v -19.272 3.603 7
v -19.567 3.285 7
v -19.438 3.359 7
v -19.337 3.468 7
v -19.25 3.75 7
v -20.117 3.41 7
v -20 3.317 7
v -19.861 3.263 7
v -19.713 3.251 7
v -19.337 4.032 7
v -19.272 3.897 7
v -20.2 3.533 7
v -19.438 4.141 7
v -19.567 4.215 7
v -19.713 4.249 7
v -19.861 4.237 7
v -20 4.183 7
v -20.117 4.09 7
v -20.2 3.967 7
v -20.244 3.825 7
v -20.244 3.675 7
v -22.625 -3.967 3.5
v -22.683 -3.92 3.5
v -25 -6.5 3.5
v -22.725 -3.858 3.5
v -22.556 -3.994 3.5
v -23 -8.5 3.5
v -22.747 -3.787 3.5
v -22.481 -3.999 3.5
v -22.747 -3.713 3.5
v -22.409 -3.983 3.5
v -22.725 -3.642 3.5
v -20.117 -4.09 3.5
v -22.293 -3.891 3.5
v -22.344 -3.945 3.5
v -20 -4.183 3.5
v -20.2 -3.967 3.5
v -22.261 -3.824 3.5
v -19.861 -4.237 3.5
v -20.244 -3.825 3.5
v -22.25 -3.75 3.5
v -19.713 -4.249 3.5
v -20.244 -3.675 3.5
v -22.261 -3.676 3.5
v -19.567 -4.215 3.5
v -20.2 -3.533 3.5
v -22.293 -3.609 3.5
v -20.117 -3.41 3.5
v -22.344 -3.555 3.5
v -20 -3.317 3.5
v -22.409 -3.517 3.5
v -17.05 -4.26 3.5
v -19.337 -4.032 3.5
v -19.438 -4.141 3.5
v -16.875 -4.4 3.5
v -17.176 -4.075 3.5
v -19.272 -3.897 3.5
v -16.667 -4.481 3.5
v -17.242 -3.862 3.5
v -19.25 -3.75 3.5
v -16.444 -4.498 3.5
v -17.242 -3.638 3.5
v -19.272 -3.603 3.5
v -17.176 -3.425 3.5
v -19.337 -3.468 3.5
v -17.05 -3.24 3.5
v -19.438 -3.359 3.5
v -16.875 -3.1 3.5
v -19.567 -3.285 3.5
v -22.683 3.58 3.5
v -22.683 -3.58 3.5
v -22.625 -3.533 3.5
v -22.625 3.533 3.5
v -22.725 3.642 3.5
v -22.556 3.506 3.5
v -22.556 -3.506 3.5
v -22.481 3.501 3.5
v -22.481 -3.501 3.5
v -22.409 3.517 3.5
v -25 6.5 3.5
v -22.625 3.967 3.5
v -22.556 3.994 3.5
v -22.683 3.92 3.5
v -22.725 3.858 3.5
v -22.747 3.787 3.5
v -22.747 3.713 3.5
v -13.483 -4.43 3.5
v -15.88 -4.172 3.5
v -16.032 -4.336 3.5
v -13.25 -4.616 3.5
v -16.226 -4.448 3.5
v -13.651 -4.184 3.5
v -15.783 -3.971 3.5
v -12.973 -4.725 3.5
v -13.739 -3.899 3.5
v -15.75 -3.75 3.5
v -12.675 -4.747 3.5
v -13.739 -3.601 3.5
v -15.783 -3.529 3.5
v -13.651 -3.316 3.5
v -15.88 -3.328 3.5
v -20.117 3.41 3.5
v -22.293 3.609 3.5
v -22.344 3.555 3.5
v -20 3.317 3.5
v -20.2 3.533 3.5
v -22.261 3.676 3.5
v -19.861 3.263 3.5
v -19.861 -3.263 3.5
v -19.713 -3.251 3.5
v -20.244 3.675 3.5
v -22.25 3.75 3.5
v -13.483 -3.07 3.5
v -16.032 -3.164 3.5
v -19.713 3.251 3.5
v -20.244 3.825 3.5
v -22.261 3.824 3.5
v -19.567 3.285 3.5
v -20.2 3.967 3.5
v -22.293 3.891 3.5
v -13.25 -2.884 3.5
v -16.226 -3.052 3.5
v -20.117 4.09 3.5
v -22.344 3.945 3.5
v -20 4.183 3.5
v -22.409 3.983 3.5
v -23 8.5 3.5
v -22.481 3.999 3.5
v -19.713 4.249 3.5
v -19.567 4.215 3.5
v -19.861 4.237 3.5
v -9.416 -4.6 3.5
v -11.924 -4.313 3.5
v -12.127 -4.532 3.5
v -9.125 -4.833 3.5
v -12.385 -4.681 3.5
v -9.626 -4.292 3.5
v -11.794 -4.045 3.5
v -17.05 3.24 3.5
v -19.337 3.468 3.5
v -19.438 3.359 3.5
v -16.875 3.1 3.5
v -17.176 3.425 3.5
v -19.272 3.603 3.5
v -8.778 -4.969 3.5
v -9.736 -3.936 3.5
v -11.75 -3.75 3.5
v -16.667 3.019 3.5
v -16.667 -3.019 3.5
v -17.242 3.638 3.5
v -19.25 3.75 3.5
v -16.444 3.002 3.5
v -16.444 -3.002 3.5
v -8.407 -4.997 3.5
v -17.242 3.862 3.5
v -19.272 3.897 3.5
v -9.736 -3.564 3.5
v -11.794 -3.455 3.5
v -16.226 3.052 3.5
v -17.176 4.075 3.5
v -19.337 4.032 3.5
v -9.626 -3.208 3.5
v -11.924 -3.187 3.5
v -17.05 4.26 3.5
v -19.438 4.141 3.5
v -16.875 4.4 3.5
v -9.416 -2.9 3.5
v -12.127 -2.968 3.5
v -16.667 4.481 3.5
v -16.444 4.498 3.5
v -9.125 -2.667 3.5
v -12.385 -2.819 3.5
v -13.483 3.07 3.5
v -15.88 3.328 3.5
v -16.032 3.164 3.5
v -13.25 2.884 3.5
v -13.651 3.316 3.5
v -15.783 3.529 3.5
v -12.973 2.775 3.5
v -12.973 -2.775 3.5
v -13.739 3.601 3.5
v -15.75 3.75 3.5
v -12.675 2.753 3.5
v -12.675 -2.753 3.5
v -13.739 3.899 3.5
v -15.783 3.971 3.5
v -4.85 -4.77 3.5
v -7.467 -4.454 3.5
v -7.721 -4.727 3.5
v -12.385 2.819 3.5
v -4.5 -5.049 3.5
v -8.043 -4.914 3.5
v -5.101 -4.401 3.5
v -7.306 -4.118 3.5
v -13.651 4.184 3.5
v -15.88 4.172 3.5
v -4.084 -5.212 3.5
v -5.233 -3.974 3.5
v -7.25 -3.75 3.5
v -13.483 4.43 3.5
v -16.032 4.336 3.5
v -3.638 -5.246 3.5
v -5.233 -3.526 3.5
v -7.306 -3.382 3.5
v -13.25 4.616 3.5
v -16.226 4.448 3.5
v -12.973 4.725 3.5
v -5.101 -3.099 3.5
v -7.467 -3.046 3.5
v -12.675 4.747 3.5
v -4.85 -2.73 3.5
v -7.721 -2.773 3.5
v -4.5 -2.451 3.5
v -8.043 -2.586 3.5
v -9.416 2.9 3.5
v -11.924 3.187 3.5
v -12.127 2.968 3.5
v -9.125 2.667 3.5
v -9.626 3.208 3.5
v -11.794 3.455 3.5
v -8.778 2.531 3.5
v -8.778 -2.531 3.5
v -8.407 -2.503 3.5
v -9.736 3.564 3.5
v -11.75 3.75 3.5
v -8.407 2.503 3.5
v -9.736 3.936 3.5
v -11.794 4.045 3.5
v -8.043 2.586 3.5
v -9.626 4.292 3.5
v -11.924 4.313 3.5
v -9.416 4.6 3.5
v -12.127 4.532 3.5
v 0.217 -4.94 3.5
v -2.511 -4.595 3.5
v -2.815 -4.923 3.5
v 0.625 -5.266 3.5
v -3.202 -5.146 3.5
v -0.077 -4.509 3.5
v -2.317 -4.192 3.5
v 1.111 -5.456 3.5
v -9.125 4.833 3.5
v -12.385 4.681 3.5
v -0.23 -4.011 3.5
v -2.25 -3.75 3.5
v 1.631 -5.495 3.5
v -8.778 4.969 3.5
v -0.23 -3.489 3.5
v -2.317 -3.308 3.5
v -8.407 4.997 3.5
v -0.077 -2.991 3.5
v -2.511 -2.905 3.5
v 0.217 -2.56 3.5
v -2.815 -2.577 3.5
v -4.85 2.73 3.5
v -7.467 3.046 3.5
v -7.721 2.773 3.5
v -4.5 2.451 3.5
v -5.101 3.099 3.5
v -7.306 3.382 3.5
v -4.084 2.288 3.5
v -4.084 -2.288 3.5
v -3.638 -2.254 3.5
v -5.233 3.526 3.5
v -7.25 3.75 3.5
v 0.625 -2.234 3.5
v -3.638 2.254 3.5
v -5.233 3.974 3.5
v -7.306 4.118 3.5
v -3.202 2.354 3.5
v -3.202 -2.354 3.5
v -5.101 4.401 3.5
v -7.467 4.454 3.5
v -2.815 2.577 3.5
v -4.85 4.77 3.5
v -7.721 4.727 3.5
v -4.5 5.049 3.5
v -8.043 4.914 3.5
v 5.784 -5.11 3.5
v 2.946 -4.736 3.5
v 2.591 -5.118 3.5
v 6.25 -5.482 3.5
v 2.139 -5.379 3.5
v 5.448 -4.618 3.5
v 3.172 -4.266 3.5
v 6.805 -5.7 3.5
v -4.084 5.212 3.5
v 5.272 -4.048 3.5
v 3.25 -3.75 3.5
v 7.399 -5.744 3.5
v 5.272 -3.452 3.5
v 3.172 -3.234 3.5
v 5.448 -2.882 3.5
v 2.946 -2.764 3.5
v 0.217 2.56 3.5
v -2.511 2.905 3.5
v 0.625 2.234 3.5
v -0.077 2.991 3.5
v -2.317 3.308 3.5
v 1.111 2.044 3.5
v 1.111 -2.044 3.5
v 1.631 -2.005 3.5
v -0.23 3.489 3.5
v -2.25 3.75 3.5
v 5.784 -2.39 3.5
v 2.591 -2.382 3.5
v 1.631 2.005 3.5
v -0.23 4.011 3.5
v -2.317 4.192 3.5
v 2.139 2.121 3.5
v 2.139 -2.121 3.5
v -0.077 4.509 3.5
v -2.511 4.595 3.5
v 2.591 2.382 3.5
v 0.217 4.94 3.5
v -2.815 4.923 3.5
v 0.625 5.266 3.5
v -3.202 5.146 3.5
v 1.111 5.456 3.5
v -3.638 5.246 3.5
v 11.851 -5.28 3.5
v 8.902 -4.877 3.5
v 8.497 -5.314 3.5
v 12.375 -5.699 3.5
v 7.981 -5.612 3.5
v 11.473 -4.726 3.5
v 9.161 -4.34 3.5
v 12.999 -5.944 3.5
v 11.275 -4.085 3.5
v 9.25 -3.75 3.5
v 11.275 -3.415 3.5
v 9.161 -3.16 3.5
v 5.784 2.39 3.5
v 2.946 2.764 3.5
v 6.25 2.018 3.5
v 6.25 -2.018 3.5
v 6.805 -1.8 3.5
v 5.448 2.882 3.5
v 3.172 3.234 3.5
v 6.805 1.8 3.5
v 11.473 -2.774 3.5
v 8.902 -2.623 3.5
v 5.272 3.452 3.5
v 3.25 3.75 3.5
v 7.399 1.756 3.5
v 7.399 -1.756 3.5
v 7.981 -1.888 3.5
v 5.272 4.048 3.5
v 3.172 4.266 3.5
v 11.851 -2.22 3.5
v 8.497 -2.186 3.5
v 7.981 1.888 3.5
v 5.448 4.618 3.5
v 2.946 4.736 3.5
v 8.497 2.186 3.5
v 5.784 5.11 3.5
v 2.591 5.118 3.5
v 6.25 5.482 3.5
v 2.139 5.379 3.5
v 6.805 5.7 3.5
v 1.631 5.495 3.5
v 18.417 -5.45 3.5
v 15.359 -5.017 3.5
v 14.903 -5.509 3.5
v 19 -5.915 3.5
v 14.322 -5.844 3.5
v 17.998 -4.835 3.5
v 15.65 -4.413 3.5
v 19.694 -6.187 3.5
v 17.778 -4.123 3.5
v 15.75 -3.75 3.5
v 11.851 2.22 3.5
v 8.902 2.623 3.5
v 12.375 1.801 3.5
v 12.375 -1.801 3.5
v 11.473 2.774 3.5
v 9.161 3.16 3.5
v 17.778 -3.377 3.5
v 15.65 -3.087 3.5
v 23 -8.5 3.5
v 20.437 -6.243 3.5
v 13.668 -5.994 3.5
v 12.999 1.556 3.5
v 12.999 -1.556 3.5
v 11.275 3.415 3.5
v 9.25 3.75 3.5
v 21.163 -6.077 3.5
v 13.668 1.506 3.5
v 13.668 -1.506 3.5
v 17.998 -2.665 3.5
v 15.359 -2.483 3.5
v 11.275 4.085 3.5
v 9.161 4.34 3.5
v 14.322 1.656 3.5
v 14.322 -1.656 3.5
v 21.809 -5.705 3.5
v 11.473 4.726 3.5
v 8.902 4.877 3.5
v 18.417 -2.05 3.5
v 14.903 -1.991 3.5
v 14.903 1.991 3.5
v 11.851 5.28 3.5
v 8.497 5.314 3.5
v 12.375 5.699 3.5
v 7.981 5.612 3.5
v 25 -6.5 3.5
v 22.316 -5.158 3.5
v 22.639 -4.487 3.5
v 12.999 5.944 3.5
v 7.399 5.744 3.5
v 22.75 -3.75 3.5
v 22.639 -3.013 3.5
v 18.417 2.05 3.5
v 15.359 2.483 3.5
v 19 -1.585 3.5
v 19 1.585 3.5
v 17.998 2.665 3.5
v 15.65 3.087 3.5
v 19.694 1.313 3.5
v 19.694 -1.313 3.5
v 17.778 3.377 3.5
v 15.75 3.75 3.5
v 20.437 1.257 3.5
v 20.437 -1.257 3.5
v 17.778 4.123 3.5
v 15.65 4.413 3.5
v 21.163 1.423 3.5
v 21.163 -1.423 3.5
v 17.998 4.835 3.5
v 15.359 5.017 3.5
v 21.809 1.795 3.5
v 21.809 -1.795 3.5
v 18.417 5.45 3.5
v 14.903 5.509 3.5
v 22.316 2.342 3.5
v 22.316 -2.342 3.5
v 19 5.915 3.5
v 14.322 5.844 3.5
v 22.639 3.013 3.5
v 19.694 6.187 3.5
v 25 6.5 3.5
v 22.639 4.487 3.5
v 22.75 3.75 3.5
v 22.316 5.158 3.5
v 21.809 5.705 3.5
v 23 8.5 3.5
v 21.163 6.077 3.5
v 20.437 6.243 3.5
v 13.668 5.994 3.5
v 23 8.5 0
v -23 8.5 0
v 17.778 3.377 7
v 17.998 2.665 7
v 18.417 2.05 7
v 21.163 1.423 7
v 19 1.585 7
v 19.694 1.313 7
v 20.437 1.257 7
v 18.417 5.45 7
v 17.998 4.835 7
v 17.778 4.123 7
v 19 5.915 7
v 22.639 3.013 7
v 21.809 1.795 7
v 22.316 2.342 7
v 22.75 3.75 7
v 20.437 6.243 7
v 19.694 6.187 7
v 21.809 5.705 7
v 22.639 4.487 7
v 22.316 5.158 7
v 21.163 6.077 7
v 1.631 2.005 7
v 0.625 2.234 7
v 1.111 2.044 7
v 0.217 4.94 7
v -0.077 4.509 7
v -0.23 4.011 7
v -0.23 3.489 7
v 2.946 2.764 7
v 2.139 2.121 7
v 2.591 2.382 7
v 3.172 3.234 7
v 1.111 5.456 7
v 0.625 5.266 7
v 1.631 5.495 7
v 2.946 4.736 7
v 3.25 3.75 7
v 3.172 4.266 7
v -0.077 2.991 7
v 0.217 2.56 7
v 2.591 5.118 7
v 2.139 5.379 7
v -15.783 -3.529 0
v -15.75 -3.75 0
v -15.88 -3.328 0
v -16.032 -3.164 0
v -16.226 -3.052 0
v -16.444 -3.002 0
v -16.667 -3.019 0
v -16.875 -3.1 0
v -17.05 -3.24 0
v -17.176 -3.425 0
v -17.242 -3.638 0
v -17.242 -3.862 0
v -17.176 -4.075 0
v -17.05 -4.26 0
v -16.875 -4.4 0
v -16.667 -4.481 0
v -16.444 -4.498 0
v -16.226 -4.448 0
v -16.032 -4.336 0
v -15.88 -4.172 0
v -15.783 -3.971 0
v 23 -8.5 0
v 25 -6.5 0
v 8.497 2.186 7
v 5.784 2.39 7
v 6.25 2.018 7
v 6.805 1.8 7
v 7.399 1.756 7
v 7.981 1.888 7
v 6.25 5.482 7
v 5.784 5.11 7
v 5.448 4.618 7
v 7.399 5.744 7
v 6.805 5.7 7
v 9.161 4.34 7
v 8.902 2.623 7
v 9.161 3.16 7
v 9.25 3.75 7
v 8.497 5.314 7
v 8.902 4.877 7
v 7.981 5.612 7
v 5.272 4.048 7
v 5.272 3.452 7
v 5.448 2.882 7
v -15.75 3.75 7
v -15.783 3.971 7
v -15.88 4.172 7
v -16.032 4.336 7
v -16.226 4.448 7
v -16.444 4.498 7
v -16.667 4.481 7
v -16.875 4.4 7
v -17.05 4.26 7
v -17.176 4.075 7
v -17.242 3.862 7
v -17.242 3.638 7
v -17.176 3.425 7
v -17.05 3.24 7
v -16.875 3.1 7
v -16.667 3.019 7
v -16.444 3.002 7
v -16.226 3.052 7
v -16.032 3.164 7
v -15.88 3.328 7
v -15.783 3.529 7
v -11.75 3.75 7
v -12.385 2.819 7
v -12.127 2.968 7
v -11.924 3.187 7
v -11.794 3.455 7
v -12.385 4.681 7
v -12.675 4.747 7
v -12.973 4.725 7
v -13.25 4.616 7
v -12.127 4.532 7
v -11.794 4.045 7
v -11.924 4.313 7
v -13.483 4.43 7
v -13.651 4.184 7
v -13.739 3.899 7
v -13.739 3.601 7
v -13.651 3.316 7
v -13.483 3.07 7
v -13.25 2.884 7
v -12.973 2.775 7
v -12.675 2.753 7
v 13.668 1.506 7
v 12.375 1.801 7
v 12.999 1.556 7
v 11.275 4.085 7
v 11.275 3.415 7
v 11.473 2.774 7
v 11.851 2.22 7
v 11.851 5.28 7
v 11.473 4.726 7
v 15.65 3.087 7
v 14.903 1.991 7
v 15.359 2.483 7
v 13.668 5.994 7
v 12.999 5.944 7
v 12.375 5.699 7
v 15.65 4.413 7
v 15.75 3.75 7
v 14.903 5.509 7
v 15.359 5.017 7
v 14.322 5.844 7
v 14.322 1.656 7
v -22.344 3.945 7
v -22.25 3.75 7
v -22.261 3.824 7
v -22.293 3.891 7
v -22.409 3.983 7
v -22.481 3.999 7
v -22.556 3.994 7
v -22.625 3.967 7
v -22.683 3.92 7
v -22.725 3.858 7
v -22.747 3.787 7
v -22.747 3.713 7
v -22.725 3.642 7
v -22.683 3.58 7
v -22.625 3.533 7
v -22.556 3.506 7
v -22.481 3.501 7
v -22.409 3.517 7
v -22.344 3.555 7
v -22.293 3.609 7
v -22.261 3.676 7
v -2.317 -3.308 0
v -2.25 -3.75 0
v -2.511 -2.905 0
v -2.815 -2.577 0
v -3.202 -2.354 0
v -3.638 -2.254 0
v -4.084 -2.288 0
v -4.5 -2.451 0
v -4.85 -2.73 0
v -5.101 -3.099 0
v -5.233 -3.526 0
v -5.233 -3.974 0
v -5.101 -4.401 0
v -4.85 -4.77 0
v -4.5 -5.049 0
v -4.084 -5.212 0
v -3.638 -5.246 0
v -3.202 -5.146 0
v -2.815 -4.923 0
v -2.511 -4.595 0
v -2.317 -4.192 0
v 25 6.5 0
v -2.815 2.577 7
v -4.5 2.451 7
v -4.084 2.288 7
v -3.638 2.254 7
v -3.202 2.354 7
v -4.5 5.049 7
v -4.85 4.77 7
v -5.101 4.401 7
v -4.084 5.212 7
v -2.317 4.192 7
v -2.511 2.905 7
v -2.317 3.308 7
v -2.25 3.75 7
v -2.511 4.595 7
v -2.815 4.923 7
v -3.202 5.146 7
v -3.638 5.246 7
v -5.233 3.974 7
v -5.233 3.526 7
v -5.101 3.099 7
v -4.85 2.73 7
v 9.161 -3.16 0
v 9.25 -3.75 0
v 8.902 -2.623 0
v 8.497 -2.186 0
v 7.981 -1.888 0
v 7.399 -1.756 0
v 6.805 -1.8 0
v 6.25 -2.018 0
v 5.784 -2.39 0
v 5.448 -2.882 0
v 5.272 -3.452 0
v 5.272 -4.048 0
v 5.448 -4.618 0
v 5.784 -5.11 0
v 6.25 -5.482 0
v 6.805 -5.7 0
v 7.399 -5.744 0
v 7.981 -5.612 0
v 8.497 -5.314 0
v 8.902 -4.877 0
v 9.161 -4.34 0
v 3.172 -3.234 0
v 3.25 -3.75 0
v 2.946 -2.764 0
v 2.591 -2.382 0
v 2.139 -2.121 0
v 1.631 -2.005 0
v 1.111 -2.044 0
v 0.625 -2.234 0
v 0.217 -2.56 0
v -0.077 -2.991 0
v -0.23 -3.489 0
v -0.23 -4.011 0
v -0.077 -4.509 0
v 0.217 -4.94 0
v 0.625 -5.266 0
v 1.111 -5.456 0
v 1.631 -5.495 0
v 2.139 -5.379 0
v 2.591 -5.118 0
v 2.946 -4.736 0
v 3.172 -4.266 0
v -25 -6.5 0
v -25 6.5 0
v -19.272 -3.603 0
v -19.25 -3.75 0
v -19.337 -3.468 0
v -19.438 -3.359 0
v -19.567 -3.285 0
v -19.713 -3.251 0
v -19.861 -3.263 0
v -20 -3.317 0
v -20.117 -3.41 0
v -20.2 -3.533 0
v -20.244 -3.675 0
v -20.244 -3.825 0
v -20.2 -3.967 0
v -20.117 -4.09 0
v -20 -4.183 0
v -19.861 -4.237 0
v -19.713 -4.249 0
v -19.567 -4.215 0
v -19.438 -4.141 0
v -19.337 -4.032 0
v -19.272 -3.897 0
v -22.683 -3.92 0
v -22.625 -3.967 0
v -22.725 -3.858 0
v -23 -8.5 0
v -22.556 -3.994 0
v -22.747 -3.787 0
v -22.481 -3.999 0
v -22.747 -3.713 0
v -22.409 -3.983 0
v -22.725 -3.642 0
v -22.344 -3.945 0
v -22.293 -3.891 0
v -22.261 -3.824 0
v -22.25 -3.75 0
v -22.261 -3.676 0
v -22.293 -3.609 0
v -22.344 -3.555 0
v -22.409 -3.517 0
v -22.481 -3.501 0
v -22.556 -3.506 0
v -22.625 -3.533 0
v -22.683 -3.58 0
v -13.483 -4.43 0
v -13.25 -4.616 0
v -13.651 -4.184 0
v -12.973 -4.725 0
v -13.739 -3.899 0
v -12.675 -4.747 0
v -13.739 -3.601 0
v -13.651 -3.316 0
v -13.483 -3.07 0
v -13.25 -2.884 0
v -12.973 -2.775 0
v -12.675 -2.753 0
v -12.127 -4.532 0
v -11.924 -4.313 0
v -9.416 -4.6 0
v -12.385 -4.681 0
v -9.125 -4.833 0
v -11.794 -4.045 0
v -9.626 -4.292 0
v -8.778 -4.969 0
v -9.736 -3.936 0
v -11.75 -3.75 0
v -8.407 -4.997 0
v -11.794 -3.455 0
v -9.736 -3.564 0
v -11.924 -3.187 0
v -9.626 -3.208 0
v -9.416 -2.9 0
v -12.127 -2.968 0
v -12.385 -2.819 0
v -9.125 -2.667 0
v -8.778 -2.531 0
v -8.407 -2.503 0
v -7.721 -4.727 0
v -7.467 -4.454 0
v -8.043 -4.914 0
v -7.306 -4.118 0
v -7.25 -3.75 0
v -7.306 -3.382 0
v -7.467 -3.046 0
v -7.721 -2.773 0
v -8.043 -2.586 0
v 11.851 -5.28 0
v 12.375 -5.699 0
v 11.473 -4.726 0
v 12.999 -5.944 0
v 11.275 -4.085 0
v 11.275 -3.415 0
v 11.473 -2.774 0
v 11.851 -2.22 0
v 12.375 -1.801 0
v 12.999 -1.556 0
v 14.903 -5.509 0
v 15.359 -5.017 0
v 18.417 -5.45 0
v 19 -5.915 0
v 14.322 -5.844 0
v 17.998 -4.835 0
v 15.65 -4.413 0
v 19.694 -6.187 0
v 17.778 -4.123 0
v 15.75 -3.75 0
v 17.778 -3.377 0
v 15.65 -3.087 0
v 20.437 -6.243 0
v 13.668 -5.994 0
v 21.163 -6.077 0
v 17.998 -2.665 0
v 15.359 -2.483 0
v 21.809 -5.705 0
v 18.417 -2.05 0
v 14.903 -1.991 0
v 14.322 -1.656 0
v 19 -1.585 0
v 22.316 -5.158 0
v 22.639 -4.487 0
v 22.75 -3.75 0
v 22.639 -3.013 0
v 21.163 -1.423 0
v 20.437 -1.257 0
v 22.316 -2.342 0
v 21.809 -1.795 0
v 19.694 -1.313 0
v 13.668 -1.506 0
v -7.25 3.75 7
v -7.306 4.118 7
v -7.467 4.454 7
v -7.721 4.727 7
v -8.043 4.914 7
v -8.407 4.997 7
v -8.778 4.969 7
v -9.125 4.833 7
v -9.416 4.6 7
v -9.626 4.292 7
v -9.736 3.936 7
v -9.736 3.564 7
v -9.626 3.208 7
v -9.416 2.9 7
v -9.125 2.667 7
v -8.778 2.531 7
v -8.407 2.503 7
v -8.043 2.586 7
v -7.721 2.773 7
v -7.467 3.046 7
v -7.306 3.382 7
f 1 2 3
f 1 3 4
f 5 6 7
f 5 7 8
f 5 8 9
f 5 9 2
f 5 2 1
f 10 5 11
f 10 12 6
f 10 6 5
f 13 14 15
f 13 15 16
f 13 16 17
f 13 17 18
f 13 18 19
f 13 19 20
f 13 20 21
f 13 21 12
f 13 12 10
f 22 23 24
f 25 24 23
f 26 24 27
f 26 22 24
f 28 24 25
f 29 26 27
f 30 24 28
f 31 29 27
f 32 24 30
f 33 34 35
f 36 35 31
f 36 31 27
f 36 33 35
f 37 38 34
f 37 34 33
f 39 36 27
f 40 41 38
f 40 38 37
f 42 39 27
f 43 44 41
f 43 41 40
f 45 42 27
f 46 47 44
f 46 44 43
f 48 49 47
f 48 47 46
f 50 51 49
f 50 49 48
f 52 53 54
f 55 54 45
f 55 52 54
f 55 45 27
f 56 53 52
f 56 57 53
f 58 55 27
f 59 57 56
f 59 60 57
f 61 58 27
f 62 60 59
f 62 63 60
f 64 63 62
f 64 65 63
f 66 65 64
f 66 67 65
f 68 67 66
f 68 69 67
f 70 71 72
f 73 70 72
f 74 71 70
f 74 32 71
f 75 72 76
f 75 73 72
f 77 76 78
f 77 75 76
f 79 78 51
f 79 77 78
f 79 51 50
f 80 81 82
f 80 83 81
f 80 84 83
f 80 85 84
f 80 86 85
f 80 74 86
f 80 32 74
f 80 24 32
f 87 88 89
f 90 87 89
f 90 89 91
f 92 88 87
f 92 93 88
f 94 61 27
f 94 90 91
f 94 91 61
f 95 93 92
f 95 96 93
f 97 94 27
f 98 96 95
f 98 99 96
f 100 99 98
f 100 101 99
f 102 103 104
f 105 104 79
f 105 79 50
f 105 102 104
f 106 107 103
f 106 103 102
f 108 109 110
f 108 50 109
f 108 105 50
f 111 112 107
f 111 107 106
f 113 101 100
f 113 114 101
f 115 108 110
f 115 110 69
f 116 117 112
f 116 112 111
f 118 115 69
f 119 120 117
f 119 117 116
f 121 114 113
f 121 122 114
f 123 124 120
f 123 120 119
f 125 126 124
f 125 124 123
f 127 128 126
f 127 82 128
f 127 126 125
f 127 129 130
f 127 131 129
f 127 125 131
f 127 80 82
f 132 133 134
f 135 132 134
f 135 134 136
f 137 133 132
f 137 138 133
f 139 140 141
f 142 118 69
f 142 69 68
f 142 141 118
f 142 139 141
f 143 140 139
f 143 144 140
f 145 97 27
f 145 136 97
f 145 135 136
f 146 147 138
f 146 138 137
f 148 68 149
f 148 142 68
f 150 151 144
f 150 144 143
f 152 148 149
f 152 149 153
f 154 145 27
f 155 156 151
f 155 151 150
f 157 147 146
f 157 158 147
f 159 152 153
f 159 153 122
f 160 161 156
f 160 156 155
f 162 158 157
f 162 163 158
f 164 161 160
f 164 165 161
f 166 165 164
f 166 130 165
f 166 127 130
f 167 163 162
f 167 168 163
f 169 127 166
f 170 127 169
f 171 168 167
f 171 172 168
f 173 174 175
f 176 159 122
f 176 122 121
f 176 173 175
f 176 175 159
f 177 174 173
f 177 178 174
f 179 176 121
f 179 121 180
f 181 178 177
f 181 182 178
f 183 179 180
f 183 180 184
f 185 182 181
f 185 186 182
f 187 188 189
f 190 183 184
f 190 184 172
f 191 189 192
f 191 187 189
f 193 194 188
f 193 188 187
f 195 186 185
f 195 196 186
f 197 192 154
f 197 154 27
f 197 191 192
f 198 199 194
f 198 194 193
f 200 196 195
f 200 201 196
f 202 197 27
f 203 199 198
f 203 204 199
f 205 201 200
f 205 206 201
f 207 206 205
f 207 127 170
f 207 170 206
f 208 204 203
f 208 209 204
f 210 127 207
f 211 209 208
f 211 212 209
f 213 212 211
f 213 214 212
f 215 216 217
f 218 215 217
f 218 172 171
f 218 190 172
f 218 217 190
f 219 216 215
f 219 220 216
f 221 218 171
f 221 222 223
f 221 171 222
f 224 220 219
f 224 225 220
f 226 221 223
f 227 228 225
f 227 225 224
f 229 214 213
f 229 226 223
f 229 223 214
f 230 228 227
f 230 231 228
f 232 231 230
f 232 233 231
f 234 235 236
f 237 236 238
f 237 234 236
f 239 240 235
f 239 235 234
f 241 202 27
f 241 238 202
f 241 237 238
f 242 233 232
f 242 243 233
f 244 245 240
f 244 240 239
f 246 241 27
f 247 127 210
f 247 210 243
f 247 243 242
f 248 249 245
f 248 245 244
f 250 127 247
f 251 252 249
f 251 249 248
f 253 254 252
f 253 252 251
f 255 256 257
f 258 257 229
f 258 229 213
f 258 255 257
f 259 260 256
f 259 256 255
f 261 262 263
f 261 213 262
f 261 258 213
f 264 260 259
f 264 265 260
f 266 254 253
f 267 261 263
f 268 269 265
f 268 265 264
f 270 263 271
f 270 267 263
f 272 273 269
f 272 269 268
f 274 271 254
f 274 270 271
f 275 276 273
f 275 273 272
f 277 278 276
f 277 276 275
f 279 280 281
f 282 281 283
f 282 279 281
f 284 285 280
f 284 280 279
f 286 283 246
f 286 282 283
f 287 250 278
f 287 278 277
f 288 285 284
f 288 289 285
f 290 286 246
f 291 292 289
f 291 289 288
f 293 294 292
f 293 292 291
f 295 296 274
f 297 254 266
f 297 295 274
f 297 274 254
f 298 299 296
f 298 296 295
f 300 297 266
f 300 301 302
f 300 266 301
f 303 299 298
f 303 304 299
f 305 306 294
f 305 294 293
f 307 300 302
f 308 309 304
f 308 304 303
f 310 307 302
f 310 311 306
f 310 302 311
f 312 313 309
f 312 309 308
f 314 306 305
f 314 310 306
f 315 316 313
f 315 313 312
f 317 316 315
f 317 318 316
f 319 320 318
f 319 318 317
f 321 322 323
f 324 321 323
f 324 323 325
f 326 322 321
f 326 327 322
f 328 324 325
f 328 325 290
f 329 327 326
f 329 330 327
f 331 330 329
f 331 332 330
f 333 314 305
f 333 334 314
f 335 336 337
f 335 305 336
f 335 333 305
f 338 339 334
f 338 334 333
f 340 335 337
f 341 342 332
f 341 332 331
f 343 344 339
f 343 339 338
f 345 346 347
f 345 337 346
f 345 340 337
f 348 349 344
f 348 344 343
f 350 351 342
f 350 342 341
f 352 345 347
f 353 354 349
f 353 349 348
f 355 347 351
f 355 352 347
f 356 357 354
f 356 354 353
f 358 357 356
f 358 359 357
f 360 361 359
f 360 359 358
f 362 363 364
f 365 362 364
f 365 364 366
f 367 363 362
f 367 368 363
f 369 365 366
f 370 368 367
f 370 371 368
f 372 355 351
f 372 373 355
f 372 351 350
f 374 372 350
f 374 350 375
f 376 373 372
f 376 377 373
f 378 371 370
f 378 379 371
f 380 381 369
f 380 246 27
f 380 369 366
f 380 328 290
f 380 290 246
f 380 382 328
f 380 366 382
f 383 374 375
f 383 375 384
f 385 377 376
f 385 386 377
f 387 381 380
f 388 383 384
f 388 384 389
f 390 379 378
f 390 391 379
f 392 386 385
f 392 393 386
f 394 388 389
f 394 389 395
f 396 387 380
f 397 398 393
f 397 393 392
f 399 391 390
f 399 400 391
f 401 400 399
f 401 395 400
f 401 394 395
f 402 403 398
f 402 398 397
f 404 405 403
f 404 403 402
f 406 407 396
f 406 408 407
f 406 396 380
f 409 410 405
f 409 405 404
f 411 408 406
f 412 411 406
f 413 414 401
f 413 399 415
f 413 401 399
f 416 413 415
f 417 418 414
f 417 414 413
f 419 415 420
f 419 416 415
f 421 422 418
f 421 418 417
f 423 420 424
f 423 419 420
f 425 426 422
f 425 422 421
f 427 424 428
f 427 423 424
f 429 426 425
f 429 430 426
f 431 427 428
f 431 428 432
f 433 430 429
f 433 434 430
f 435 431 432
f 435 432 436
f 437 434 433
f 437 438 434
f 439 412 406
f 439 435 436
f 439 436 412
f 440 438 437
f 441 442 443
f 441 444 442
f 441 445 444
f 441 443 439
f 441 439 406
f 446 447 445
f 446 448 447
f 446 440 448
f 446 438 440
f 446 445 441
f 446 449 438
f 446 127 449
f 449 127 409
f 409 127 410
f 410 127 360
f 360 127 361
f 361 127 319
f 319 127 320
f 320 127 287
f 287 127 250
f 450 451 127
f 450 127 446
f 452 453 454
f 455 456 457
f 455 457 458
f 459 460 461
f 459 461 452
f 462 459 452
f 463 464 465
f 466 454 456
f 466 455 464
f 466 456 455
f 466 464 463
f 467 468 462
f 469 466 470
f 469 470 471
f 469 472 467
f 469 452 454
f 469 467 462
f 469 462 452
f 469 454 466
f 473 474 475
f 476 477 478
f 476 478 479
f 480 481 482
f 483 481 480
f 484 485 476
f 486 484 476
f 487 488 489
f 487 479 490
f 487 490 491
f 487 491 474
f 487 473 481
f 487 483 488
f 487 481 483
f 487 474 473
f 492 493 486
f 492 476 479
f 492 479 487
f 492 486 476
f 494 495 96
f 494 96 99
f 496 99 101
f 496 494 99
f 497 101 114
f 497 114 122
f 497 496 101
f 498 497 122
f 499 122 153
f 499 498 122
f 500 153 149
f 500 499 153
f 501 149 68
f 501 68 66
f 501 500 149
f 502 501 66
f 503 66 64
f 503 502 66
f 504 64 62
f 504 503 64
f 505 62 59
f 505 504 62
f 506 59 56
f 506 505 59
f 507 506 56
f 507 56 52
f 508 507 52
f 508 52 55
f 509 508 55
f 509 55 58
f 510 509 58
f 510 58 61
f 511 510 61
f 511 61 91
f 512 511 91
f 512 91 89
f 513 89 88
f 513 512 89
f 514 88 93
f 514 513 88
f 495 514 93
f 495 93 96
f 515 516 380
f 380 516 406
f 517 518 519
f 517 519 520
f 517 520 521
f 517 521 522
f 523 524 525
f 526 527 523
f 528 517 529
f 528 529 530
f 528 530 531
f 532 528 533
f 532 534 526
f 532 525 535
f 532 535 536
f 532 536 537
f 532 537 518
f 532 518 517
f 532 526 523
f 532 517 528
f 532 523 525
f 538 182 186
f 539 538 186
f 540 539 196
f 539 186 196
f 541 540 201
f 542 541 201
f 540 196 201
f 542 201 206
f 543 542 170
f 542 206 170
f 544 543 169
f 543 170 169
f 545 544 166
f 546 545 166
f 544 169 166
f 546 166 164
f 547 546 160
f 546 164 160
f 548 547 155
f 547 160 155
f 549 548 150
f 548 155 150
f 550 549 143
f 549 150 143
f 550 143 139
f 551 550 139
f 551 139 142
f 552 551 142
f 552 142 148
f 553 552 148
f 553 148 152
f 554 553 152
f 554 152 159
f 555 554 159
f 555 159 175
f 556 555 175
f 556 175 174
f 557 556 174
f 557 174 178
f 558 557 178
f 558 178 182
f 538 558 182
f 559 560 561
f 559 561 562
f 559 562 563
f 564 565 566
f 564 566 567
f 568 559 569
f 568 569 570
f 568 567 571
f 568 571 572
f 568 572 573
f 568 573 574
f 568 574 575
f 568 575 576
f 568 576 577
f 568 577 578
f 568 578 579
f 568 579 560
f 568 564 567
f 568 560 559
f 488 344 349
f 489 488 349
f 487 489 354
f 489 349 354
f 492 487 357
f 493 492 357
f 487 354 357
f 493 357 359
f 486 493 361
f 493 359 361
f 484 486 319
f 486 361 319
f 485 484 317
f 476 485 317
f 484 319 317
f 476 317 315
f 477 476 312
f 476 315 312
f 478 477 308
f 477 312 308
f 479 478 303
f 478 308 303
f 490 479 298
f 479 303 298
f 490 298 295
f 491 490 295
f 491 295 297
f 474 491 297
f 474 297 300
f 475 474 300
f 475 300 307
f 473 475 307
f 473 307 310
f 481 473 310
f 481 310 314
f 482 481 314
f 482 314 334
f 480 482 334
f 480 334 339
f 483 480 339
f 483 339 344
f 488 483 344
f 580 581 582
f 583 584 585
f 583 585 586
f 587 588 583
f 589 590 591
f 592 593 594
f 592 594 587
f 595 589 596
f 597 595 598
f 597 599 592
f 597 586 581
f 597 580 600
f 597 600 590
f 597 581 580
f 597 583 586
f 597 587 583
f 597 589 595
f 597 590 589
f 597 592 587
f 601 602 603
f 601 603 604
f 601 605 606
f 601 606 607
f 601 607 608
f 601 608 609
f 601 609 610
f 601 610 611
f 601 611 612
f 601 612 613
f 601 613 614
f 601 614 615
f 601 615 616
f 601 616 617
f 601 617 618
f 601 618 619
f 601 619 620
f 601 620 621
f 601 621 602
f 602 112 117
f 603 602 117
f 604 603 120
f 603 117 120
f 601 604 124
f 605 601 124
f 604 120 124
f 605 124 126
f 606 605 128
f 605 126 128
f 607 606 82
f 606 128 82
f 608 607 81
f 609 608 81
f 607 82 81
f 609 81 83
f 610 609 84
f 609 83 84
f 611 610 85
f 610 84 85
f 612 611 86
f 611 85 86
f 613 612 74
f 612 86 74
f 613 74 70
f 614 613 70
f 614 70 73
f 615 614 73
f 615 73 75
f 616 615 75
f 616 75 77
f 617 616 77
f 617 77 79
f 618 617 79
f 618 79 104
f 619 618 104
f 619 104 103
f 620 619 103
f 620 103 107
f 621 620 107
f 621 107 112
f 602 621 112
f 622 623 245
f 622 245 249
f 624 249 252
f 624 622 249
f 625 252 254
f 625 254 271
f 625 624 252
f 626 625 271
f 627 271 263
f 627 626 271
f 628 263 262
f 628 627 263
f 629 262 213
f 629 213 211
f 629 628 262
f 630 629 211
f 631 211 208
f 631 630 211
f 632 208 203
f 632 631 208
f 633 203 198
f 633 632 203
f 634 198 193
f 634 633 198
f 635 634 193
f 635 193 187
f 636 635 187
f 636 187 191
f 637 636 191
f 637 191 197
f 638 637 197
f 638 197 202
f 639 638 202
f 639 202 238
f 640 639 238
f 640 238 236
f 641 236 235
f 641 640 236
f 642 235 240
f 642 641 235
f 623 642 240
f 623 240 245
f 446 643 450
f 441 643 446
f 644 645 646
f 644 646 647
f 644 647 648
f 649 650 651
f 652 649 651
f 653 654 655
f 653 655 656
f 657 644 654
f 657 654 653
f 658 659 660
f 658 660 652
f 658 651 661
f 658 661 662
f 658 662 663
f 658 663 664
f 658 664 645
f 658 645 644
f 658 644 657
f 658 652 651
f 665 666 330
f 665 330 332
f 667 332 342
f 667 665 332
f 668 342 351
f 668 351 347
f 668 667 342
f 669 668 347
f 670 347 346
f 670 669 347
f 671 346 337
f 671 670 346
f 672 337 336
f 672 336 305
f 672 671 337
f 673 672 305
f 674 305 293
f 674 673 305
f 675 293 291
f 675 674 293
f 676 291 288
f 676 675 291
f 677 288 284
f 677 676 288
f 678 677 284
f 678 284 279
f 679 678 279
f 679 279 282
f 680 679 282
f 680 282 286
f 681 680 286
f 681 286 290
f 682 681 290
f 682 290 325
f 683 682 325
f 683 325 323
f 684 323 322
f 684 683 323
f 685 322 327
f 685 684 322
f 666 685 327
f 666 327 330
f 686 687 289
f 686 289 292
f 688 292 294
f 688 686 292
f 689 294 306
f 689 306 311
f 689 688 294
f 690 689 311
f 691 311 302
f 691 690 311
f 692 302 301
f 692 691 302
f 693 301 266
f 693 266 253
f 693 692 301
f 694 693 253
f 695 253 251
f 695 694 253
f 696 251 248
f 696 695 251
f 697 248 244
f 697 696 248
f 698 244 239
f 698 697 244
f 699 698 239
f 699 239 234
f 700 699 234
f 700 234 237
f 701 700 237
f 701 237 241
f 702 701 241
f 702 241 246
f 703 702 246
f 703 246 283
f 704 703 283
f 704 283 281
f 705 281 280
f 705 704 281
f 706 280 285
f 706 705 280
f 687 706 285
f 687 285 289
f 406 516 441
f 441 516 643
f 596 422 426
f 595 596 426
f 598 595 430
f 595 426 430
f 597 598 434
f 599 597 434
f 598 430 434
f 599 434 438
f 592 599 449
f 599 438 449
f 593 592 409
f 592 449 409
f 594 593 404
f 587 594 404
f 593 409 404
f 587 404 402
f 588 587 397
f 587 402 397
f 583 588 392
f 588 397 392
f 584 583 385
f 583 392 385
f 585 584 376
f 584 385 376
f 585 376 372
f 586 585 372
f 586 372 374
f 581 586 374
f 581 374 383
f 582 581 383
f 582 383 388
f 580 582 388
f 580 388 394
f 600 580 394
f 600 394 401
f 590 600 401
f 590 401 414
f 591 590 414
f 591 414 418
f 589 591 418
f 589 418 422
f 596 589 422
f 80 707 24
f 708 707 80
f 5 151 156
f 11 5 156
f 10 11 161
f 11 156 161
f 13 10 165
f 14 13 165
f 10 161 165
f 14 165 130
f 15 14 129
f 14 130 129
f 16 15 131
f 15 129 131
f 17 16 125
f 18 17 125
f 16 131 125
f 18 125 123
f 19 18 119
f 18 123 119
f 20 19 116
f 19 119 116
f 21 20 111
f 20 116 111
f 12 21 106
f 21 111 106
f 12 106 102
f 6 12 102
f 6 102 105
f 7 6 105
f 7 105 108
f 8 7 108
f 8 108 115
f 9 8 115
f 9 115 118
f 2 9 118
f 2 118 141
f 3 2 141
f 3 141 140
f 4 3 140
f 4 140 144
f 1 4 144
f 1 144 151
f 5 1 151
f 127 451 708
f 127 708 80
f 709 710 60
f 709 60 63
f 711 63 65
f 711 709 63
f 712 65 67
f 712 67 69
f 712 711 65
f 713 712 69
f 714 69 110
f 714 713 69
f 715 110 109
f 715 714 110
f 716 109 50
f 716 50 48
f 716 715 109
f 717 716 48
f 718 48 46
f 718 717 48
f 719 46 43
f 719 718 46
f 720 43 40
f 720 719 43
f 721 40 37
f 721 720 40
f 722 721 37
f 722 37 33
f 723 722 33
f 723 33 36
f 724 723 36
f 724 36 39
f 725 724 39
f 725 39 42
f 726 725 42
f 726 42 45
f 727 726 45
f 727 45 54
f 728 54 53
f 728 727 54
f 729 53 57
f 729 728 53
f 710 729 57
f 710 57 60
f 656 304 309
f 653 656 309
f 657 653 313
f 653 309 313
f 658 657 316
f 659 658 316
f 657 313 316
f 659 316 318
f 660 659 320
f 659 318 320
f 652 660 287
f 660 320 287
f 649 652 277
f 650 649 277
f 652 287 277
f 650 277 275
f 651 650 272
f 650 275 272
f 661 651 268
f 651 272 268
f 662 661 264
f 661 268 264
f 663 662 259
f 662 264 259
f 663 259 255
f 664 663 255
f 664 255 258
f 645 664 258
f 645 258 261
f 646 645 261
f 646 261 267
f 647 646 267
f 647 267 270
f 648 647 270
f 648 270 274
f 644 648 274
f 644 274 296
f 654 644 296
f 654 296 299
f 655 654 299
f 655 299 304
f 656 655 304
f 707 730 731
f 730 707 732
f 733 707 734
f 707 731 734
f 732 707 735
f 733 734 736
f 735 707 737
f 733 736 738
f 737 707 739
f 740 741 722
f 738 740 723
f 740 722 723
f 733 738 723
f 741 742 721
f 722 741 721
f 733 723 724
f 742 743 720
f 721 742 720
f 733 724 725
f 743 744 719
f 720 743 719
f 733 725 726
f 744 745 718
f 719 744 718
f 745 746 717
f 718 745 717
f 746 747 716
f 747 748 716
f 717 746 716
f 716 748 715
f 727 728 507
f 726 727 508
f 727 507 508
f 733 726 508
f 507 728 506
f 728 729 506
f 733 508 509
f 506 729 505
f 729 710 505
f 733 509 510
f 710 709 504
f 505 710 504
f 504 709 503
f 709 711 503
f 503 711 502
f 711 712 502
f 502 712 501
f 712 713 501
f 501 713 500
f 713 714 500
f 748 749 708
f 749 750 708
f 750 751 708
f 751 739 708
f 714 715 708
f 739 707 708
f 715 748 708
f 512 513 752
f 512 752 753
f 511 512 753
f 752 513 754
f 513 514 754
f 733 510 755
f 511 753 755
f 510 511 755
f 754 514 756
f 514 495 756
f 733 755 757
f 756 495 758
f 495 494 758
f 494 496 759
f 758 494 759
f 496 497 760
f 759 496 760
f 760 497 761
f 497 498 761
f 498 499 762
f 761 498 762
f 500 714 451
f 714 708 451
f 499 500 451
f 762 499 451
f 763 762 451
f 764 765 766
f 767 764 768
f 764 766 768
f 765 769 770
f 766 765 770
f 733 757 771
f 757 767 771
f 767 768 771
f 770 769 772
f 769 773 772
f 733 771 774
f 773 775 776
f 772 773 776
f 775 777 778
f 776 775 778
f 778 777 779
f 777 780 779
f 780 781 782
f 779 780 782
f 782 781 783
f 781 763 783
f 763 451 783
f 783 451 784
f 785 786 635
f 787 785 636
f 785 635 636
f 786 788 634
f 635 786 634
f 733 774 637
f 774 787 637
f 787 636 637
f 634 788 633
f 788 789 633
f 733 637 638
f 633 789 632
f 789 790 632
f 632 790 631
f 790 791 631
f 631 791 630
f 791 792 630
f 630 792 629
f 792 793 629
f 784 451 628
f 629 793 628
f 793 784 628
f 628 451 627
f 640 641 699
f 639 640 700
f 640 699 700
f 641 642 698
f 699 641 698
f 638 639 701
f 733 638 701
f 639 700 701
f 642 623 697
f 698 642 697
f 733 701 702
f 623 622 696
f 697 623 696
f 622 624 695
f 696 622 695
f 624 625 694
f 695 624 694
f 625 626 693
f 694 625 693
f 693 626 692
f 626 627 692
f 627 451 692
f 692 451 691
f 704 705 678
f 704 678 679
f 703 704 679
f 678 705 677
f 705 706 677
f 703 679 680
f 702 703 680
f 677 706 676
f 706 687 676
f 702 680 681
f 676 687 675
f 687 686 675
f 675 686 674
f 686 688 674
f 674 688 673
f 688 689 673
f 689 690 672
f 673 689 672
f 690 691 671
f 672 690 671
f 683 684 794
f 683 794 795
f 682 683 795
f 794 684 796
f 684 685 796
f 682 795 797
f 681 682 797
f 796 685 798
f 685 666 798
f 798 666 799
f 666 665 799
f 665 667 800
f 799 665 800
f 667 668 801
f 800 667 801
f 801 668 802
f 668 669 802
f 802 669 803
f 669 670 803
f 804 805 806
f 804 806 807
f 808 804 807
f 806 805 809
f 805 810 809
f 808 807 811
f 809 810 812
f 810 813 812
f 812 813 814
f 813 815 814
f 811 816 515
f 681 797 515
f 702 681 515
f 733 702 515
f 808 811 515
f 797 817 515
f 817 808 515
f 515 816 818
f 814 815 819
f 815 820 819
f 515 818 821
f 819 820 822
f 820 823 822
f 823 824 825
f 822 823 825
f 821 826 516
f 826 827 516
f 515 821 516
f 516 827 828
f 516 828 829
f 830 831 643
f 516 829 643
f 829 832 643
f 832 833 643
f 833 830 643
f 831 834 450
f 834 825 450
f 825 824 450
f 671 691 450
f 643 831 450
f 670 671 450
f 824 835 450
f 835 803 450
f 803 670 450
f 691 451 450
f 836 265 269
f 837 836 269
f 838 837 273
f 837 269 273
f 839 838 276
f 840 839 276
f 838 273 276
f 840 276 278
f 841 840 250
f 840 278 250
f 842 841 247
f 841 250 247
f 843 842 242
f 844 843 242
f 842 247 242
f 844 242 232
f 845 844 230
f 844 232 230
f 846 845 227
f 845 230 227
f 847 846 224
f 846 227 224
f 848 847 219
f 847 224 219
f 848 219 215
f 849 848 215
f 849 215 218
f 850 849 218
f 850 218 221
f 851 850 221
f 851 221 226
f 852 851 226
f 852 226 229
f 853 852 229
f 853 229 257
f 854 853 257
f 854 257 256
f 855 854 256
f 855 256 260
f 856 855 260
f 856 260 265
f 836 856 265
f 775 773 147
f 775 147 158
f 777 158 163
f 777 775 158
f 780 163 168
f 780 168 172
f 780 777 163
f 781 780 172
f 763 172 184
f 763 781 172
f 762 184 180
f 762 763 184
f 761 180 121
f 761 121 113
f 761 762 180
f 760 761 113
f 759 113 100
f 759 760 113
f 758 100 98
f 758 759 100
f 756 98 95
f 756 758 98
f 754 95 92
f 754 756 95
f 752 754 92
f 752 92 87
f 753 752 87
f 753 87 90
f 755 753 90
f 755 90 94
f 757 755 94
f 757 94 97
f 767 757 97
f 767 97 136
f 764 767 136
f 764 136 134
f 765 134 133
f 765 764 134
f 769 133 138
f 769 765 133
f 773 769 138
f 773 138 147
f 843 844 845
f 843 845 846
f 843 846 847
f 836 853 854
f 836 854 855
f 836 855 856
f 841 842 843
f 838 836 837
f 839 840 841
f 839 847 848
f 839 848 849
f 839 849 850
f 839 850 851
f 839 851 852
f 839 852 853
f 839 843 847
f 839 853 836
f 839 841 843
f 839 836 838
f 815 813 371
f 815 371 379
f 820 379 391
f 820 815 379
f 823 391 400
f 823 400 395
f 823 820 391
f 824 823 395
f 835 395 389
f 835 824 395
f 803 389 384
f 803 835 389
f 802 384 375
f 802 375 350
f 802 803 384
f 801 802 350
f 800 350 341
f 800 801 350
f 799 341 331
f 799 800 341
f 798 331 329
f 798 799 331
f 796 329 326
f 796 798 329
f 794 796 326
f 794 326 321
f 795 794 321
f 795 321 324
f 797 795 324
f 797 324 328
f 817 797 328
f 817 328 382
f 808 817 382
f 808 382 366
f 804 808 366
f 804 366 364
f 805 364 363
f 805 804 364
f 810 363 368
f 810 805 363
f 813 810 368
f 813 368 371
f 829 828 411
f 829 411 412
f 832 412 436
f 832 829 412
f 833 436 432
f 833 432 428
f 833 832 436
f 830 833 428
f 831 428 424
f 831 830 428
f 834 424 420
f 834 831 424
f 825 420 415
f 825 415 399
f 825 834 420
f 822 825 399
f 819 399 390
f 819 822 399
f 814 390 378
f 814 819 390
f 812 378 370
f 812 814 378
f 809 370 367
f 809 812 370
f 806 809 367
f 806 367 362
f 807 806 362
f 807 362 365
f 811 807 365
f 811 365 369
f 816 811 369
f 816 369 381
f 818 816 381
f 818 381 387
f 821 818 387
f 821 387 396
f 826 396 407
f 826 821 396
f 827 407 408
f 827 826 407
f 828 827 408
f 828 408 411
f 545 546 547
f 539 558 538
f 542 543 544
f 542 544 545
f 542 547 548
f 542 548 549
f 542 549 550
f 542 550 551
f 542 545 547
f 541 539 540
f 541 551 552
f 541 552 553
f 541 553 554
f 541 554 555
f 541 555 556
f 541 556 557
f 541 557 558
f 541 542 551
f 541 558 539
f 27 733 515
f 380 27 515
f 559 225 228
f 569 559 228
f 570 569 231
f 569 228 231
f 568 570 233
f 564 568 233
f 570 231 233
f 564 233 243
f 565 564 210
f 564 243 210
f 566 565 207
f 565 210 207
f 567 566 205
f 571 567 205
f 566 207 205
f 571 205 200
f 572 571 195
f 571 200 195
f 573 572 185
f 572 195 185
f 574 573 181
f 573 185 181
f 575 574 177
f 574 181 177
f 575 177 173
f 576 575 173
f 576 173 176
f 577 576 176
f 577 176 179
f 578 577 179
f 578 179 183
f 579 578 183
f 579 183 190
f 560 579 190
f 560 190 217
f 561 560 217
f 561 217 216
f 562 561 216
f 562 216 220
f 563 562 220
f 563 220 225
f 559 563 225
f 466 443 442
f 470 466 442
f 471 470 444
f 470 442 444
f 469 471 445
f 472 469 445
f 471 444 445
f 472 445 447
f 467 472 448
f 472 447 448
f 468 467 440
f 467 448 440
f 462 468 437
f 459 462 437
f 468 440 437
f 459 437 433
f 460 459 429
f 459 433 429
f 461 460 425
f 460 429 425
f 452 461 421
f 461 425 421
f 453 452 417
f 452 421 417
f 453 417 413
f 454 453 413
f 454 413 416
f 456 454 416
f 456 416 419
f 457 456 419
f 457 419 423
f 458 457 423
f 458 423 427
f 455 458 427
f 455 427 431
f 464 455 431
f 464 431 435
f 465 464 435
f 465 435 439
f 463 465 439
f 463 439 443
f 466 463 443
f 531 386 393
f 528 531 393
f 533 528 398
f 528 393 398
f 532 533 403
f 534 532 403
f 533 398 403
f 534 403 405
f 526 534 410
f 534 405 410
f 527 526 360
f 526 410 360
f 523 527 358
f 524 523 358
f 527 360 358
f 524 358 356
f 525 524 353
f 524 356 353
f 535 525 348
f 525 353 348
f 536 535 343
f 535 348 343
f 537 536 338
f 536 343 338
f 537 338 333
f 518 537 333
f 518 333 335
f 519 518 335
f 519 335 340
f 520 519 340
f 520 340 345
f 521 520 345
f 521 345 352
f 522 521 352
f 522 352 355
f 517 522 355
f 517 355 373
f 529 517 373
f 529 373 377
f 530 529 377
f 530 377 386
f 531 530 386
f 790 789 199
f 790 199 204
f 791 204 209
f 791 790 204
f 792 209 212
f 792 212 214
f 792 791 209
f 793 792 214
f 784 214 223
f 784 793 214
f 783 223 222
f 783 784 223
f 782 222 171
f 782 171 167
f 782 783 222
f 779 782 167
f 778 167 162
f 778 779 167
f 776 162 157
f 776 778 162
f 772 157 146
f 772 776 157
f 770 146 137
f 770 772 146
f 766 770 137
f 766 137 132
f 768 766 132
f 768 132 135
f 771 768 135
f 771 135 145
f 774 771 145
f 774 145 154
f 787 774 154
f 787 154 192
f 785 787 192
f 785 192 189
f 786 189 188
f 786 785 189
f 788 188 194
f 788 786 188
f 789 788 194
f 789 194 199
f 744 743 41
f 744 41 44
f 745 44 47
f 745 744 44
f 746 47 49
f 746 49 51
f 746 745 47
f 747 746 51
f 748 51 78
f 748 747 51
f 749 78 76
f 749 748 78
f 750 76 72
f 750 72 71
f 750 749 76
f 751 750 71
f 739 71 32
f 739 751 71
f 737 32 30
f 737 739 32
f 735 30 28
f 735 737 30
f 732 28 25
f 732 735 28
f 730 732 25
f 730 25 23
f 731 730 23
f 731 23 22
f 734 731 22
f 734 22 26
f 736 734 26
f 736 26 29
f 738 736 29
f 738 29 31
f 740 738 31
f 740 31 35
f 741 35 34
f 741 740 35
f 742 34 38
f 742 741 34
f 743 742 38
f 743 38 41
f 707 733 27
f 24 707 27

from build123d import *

# Parameters (mm, degrees)
F0_W     = 50
F0_H     = 17
F0_R     = 0.25
F0_R_2   = 0.5
F0_R_3   = 0.75
F0_R_4   = 1
F0_R_5   = 1.25
F0_R_6   = 1.5
F0_R_7   = 1.75
F0_R_8   = 2
F0_R_9   = 2.25
F0_R_10  = 2.5
F1_DEPTH = 3.5
F2_DEPTH = 7
F3_SIZE  = 2


with BuildPart() as f1:
    # F0 (on Top) → F1 (new body)
    with BuildSketch(Plane.XY):
        Rectangle(F0_W, F0_H)
        with Locations((-22.5, -3.75)):
            Circle(F0_R, mode=Mode.SUBTRACT)
        with Locations((-19.75, -3.75)):
            Circle(F0_R_2, mode=Mode.SUBTRACT)
        with Locations((-16.5, -3.75)):
            Circle(F0_R_3, mode=Mode.SUBTRACT)
        with Locations((-12.75, -3.75)):
            Circle(F0_R_4, mode=Mode.SUBTRACT)
        with Locations((-8.5, -3.75)):
            Circle(F0_R_5, mode=Mode.SUBTRACT)
        with Locations((-3.75, -3.75)):
            Circle(F0_R_6, mode=Mode.SUBTRACT)
        with Locations((1.5, -3.75)):
            Circle(F0_R_7, mode=Mode.SUBTRACT)
        with Locations((7.25, -3.75)):
            Circle(F0_R_8, mode=Mode.SUBTRACT)
        with Locations((13.5, -3.75)):
            Circle(F0_R_9, mode=Mode.SUBTRACT)
        with Locations((20.25, -3.75)):
            Circle(F0_R_10, mode=Mode.SUBTRACT)
        with Locations((-22.5, 3.75)):
            Circle(F0_R, mode=Mode.SUBTRACT)
        with Locations((-19.75, 3.75)):
            Circle(F0_R_2, mode=Mode.SUBTRACT)
        with Locations((-16.5, 3.75)):
            Circle(F0_R_3, mode=Mode.SUBTRACT)
        with Locations((-12.75, 3.75)):
            Circle(F0_R_4, mode=Mode.SUBTRACT)
        with Locations((-8.5, 3.75)):
            Circle(F0_R_5, mode=Mode.SUBTRACT)
        with Locations((-3.75, 3.75)):
            Circle(F0_R_6, mode=Mode.SUBTRACT)
        with Locations((1.5, 3.75)):
            Circle(F0_R_7, mode=Mode.SUBTRACT)
        with Locations((7.25, 3.75)):
            Circle(F0_R_8, mode=Mode.SUBTRACT)
        with Locations((13.5, 3.75)):
            Circle(F0_R_9, mode=Mode.SUBTRACT)
        with Locations((20.25, 3.75)):
            Circle(F0_R_10, mode=Mode.SUBTRACT)
    extrude(amount=F1_DEPTH)

    # F0 (on Top) → F2 (join, through all)
    with BuildSketch(Plane.XY):
        with Locations((-22.5, 3.75)):
            Circle(F0_R)
        with Locations((-19.75, 3.75)):
            Circle(F0_R_2)
        with Locations((-16.5, 3.75)):
            Circle(F0_R_3)
        with Locations((-12.75, 3.75)):
            Circle(F0_R_4)
        with Locations((-8.5, 3.75)):
            Circle(F0_R_5)
        with Locations((-3.75, 3.75)):
            Circle(F0_R_6)
        with Locations((1.5, 3.75)):
            Circle(F0_R_7)
        with Locations((7.25, 3.75)):
            Circle(F0_R_8)
        with Locations((13.5, 3.75)):
            Circle(F0_R_9)
        with Locations((20.25, 3.75)):
            Circle(F0_R_10)
    extrude(amount=F2_DEPTH)

    # F3
    f3_edges = [f1.edges().sort_by_distance(p)[0] for p in [
        (-25, -8.5, 1.75),
        (-25, 8.5, 1.75),
        (25, -8.5, 1.75),
        (25, 8.5, 1.75),
    ]]
    chamfer(f3_edges, length=F3_SIZE)


solid = f1.part
